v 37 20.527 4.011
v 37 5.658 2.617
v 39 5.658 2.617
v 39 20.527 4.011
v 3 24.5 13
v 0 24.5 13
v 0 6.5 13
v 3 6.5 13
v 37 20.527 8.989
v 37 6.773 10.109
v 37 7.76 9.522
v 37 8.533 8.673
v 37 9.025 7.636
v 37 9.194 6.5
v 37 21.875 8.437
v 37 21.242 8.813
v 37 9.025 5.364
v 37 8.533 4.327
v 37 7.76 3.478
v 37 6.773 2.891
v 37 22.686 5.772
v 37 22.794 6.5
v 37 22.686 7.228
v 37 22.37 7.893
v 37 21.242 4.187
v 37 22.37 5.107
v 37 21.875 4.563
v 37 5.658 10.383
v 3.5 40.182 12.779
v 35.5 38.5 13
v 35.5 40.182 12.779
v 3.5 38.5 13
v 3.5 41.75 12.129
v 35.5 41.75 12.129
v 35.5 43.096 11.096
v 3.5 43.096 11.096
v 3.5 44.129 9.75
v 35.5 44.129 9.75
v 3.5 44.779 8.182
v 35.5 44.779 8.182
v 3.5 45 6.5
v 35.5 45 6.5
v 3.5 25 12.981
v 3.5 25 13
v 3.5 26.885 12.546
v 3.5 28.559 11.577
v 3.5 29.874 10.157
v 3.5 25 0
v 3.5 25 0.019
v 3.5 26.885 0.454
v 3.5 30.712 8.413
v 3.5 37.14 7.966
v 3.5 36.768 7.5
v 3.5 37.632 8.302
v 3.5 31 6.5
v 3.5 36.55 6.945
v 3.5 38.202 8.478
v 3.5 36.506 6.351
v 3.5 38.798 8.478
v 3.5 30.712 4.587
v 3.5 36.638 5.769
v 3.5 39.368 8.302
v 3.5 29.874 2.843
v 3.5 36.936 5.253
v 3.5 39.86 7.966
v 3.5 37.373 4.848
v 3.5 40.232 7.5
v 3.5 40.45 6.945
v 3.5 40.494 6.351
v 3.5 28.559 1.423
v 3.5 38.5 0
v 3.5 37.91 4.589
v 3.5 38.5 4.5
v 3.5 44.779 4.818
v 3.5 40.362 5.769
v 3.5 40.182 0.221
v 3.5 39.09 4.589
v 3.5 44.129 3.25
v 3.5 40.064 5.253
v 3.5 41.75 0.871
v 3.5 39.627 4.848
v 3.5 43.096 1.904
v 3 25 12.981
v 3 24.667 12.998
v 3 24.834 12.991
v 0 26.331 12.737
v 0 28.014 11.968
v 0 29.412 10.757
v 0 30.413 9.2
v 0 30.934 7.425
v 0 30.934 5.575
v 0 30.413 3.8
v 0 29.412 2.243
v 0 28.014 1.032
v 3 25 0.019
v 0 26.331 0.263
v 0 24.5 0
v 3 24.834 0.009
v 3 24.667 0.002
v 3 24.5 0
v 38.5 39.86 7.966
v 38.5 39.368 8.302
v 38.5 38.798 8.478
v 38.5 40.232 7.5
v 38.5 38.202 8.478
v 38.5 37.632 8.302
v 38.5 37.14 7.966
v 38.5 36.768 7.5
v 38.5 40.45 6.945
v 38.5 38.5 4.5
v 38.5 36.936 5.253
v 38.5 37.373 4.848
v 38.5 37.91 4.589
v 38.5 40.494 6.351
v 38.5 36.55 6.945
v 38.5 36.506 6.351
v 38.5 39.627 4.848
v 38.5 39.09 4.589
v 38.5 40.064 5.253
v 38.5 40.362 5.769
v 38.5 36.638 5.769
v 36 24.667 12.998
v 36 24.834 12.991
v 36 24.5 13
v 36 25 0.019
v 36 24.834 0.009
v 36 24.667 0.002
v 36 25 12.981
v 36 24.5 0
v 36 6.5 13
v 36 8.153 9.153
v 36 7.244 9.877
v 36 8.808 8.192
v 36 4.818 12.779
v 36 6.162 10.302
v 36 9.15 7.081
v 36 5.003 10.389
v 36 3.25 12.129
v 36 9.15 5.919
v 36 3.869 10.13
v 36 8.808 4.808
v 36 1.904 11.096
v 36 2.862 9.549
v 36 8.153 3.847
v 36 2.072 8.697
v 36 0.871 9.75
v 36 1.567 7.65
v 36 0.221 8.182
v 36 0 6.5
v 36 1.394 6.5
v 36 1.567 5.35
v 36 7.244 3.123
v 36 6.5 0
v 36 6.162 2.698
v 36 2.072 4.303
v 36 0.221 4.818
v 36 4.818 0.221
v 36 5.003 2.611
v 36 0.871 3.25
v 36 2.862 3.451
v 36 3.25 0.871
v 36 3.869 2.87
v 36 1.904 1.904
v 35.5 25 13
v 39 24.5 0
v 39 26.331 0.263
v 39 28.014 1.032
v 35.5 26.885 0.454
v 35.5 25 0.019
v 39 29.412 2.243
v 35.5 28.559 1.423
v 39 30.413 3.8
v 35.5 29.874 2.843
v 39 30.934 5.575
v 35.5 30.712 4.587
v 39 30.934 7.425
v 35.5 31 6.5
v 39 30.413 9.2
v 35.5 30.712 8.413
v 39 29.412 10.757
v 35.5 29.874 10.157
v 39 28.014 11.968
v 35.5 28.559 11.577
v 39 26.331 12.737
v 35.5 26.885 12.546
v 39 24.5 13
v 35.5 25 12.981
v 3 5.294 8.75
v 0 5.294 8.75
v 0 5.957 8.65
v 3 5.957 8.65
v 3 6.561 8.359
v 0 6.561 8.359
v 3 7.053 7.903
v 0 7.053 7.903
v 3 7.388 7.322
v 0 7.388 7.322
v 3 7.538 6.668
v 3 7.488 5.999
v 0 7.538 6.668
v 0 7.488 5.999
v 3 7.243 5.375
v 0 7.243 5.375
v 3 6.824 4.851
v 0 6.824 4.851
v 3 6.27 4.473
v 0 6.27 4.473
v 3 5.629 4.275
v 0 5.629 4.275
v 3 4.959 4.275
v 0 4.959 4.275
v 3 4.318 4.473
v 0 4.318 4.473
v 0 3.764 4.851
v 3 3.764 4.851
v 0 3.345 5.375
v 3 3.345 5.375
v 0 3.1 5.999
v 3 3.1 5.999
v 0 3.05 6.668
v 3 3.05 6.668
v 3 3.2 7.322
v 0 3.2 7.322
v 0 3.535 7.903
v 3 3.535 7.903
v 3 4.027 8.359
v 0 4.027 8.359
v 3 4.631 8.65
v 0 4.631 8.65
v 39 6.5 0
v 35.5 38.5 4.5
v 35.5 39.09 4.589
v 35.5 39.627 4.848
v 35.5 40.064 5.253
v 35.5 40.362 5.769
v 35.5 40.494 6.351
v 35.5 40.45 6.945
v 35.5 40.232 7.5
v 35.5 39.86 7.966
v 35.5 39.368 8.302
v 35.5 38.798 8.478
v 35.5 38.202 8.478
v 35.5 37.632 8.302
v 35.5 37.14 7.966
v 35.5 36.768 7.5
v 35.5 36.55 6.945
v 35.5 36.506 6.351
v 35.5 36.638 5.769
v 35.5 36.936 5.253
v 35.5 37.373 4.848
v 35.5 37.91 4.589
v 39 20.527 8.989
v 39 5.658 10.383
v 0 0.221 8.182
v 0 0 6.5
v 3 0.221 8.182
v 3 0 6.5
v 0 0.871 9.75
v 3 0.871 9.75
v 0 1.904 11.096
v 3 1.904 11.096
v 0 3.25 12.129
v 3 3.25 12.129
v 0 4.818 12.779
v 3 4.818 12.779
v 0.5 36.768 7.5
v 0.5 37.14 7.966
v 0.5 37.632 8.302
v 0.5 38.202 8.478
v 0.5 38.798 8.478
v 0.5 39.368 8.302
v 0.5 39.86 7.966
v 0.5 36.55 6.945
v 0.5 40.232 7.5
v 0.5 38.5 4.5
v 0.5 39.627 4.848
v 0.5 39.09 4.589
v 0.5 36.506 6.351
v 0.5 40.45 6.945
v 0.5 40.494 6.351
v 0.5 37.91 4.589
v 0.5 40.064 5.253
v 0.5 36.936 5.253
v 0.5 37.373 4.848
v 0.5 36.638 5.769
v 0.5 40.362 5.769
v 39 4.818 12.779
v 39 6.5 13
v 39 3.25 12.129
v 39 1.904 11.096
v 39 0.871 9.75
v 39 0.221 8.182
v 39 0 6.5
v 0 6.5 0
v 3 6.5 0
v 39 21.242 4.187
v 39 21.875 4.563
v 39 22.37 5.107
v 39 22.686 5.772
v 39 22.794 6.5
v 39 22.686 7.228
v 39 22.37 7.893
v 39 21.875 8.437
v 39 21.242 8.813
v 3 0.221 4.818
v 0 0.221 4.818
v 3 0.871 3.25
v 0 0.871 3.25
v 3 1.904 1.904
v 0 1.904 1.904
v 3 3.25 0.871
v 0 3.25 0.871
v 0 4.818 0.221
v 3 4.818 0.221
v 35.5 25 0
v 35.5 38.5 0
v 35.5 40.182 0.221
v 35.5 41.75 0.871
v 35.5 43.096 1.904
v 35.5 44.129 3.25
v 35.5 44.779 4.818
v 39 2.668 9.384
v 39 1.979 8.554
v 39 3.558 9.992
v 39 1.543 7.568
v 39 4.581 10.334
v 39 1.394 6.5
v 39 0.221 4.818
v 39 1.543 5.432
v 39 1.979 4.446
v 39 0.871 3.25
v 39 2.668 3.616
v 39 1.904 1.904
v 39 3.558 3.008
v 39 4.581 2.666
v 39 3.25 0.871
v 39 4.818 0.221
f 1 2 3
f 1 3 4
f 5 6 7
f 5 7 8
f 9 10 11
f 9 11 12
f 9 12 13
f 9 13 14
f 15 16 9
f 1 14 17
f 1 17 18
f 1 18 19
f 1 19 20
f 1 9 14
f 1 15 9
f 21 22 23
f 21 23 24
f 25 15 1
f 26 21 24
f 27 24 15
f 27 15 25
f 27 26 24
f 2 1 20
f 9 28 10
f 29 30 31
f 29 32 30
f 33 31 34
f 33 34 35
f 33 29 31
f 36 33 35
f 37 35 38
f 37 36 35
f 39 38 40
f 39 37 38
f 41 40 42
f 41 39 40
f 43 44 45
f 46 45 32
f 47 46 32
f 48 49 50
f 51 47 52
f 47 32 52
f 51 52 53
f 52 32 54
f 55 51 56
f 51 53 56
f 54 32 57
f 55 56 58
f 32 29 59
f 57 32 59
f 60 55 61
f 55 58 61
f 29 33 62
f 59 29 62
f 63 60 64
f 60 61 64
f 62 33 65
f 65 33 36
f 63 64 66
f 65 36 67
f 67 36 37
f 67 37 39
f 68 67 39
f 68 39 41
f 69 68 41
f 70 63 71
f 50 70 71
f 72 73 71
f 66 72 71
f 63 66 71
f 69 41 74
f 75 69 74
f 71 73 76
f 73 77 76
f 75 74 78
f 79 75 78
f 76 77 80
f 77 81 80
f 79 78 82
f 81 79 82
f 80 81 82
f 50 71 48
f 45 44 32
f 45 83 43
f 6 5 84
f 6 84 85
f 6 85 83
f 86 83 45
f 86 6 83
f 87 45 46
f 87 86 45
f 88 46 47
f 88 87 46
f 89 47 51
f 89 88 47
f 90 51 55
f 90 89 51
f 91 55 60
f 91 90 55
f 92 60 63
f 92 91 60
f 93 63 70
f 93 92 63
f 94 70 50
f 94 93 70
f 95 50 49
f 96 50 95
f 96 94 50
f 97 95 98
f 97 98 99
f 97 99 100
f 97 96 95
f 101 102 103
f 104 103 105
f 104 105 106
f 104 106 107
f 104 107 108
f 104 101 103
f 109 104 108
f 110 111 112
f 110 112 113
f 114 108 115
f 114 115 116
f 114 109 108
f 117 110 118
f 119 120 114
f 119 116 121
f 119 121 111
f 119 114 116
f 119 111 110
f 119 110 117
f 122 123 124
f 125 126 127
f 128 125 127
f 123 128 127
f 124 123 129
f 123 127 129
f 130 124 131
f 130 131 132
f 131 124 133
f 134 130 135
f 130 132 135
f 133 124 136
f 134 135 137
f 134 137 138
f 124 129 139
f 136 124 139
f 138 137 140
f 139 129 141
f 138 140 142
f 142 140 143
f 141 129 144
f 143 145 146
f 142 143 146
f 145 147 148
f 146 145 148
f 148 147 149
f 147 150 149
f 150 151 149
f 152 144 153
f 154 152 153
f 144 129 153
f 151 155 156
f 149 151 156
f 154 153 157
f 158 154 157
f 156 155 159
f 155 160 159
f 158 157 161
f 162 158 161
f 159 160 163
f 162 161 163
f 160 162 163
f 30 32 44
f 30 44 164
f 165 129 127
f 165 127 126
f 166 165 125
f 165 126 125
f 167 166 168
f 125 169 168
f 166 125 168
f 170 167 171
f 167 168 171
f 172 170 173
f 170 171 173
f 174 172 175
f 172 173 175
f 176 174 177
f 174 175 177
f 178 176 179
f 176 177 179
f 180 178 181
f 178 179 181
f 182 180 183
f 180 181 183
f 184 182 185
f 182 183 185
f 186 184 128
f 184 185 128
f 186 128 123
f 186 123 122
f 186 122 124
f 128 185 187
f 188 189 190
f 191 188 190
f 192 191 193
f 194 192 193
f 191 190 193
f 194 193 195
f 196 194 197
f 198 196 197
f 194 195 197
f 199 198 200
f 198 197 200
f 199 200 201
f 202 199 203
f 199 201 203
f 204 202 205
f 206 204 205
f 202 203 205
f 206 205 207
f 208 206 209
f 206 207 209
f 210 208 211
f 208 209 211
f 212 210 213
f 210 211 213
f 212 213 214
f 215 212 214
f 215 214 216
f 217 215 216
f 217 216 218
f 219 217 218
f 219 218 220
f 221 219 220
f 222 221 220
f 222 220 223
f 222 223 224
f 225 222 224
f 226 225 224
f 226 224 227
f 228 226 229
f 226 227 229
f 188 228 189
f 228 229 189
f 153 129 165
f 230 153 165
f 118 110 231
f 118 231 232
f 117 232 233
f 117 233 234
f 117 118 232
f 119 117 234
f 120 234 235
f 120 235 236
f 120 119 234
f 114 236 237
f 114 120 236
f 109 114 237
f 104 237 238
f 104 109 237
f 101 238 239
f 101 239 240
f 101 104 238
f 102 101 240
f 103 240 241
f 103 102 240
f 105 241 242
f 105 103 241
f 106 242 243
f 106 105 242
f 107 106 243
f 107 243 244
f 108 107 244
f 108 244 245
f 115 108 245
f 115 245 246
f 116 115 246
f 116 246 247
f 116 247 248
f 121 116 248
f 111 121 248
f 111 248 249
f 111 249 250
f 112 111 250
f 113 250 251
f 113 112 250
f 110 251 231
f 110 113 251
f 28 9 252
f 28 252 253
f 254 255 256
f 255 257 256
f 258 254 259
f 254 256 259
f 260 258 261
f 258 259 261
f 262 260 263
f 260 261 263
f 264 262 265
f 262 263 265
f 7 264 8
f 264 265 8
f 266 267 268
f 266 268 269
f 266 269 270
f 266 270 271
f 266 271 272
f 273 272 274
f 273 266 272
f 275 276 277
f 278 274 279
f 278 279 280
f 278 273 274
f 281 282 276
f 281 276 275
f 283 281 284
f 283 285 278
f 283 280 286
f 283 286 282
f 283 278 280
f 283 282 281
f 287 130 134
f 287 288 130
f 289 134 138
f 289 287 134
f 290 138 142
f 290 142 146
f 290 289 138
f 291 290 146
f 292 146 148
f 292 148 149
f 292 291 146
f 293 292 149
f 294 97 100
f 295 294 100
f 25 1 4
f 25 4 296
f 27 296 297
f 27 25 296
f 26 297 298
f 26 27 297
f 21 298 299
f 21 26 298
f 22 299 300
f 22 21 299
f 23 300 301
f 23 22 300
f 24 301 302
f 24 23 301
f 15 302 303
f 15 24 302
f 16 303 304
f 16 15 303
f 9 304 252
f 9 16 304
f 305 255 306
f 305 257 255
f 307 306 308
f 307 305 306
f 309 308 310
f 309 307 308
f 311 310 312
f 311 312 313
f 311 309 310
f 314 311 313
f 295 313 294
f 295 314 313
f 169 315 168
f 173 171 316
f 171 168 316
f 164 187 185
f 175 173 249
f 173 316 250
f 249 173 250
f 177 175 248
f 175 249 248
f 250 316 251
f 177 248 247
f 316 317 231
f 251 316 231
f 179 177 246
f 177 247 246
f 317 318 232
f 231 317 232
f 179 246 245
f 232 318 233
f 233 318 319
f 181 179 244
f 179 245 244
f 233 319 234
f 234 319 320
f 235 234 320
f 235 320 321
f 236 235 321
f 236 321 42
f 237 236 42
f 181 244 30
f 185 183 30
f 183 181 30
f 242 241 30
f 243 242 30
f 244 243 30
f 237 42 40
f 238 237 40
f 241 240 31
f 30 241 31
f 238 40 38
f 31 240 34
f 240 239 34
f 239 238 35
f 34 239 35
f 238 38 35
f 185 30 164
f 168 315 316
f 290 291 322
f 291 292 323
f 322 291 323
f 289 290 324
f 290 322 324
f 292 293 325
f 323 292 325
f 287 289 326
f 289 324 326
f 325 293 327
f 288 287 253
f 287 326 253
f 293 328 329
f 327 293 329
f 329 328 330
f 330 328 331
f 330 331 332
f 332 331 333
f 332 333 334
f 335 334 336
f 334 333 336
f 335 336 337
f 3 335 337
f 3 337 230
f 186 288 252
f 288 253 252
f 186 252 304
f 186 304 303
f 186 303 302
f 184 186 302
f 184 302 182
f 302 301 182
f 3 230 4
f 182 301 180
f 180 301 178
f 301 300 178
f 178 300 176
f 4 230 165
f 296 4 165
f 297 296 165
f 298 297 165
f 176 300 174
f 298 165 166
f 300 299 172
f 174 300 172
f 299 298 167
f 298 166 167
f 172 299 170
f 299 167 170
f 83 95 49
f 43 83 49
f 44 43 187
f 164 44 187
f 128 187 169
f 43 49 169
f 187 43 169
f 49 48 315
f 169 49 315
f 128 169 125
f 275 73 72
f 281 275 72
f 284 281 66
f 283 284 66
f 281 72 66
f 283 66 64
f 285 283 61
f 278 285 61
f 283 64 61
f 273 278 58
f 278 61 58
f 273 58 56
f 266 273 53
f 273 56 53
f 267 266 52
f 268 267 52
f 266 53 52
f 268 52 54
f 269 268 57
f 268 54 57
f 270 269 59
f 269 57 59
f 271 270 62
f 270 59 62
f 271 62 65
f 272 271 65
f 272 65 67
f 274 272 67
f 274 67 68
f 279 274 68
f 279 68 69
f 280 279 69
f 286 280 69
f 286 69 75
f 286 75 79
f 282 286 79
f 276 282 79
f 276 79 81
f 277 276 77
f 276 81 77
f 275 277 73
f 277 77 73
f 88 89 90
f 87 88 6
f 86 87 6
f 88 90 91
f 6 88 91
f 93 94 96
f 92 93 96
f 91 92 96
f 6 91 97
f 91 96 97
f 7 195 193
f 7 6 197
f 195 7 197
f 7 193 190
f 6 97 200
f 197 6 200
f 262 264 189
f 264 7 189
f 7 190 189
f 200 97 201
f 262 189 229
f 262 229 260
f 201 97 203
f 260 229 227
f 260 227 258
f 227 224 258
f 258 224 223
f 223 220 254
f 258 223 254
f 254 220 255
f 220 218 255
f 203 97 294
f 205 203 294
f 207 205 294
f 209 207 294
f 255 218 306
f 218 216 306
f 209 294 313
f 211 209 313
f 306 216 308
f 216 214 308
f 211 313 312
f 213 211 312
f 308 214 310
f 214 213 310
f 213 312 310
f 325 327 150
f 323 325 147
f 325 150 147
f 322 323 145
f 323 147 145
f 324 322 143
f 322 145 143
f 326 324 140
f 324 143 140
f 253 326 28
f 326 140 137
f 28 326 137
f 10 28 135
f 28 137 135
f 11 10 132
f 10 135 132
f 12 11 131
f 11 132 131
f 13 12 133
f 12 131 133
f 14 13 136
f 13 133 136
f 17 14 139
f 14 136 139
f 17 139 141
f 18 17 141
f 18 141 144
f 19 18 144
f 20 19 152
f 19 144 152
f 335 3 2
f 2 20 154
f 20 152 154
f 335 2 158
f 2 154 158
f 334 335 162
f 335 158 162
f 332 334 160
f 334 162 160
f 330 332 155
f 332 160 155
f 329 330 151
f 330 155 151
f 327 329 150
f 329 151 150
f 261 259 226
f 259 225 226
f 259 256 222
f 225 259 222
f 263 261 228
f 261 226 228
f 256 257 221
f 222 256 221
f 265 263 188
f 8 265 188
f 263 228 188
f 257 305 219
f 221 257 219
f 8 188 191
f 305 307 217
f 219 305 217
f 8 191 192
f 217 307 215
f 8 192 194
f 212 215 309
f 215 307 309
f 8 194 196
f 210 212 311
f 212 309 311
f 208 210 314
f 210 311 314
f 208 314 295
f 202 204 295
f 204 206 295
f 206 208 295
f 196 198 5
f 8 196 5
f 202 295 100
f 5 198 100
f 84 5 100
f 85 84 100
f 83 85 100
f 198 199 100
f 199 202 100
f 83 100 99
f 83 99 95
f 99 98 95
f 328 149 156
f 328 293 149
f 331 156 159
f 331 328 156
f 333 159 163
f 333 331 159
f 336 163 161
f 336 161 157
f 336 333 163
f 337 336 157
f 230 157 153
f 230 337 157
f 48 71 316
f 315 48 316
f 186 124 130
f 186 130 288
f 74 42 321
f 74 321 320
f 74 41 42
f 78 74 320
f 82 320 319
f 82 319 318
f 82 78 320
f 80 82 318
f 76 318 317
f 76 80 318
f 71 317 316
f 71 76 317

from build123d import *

# Parameters (mm, degrees)
BOSS_EXTRUDE1_DEPTH = 13
SKETCH2_R           = 2.25
CUT_EXTRUDE1_DEPTH  = 3
SKETCH3_R           = 2
BOSS_EXTRUDE3_DEPTH = 3
BOSS_EXTRUDE4_START = 3
SKETCH4_R           = 2
BOSS_EXTRUDE4_DEPTH = 3
CUT_EXTRUDE2_DEPTH  = 3.5
CUT_EXTRUDE3_START  = -3.5
CUT_EXTRUDE3_DEPTH  = 3.5
FILLET1_R           = 6.5
SKETCH7_R           = 3.9
CUT_EXTRUDE4_DEPTH  = 60.076221951
CUT_EXTRUDE5_START  = -2
CUT_EXTRUDE5_DEPTH  = 2


with BuildPart() as part:
    # Sketch1 → Boss-Extrude1 (new body)
    with BuildSketch(Plane.XY):
        Polygon((3, 0), (3, 25), (36, 25), (36, 0), (39, 0), (39, 31), (35.5, 31), (35.5, 45), (3.5, 45), (3.5, 31), (0, 31), (0, 0), align=None)
    extrude(amount=BOSS_EXTRUDE1_DEPTH)

    # Sketch2 → Cut-Extrude1 (cut)
    with BuildSketch(Plane.ZY):
        with Locations((6.5, 5.293988539)):
            Circle(SKETCH2_R)
    extrude(amount=-CUT_EXTRUDE1_DEPTH, mode=Mode.SUBTRACT)

    # Sketch3 → Boss-Extrude3 (add)
    with BuildSketch(Plane.ZY.offset(-3.5)):
        with Locations(Location((6.5, 38.5, 0), (0, 0, 180))):
            Circle(SKETCH3_R)
    extrude(amount=BOSS_EXTRUDE3_DEPTH)

    # Sketch4 → Boss-Extrude4 (add)
    with BuildSketch(Plane(origin=(35.5, 0, 0), x_dir=(0, 0, -1), z_dir=(1, 0, 0)).offset(BOSS_EXTRUDE4_START)):
        with Locations((-6.5, 38.5)):
            Circle(SKETCH4_R)
    extrude(amount=-BOSS_EXTRUDE4_DEPTH)

    # Sketch5 → Cut-Extrude2 (cut)
    with BuildSketch(Plane.ZY):
        with BuildLine():
            Line((0, 24.5), (0, 34.231050233))
            Line((0, 34.231050233), (13, 34.231050233))
            Line((13, 34.231050233), (13, 24.5))
            ThreePointArc((13, 24.5), (6.5, 31), (0, 24.5))
        make_face()
    extrude(amount=-CUT_EXTRUDE2_DEPTH, mode=Mode.SUBTRACT)

    # Sketch6 → Cut-Extrude3 (cut)
    with BuildSketch(Plane(origin=(39, 0, 0), x_dir=(0, 0, -1), z_dir=(1, 0, 0)).offset(CUT_EXTRUDE3_START)):
        with BuildLine():
            Line((-13, 24.5), (-13, 34.712302794))
            Line((-13, 34.712302794), (0, 34.712302794))
            Line((0, 34.712302794), (0, 24.5))
            ThreePointArc((0, 24.5), (-6.5, 31), (-13, 24.5))
        make_face()
    extrude(amount=CUT_EXTRUDE3_DEPTH, mode=Mode.SUBTRACT)

    # Fillet1
    fillet1_edges = [part.edges().sort_by_distance(p)[0] for p in [
        (37.5, 0, 13),
        (37.5, 0, 0),
        (1.5, 0, 0),
        (1.5, 0, 13),
        (19.5, 45, 0),
        (19.5, 45, 13),
    ]]
    fillet(fillet1_edges, radius=FILLET1_R - 0.0001)  # a hair under: the kernel refuses the full size

    # Sketch7 → Cut-Extrude4 (cut, through all)
    with BuildSketch(Plane.ZY.offset(-36)):
        with Locations(Location((6.5, 5.293988539, 0), (0, 0, 270))):
            Circle(SKETCH7_R)
    extrude(amount=-CUT_EXTRUDE4_DEPTH, mode=Mode.SUBTRACT)

    # Sketch8 → Cut-Extrude5 (cut)
    with BuildSketch(Plane(origin=(39, 0, 0), x_dir=(0, 0, -1), z_dir=(1, 0, 0)).offset(CUT_EXTRUDE5_START)):
        with BuildLine():
            Line((-2.617023822, 5.657988539), (-4.010912706, 20.527321872))
            ThreePointArc((-4.010912706, 20.527321872), (-6.5, 22.793988539), (-8.989087294, 20.527321872))
            Line((-8.989087294, 20.527321872), (-10.382976178, 5.657988539))
            ThreePointArc((-10.382976178, 5.657988539), (-6.5, 1.393988539), (-2.617023822, 5.657988539))
        make_face()
    extrude(amount=CUT_EXTRUDE5_DEPTH, mode=Mode.SUBTRACT)


solid = part.part
